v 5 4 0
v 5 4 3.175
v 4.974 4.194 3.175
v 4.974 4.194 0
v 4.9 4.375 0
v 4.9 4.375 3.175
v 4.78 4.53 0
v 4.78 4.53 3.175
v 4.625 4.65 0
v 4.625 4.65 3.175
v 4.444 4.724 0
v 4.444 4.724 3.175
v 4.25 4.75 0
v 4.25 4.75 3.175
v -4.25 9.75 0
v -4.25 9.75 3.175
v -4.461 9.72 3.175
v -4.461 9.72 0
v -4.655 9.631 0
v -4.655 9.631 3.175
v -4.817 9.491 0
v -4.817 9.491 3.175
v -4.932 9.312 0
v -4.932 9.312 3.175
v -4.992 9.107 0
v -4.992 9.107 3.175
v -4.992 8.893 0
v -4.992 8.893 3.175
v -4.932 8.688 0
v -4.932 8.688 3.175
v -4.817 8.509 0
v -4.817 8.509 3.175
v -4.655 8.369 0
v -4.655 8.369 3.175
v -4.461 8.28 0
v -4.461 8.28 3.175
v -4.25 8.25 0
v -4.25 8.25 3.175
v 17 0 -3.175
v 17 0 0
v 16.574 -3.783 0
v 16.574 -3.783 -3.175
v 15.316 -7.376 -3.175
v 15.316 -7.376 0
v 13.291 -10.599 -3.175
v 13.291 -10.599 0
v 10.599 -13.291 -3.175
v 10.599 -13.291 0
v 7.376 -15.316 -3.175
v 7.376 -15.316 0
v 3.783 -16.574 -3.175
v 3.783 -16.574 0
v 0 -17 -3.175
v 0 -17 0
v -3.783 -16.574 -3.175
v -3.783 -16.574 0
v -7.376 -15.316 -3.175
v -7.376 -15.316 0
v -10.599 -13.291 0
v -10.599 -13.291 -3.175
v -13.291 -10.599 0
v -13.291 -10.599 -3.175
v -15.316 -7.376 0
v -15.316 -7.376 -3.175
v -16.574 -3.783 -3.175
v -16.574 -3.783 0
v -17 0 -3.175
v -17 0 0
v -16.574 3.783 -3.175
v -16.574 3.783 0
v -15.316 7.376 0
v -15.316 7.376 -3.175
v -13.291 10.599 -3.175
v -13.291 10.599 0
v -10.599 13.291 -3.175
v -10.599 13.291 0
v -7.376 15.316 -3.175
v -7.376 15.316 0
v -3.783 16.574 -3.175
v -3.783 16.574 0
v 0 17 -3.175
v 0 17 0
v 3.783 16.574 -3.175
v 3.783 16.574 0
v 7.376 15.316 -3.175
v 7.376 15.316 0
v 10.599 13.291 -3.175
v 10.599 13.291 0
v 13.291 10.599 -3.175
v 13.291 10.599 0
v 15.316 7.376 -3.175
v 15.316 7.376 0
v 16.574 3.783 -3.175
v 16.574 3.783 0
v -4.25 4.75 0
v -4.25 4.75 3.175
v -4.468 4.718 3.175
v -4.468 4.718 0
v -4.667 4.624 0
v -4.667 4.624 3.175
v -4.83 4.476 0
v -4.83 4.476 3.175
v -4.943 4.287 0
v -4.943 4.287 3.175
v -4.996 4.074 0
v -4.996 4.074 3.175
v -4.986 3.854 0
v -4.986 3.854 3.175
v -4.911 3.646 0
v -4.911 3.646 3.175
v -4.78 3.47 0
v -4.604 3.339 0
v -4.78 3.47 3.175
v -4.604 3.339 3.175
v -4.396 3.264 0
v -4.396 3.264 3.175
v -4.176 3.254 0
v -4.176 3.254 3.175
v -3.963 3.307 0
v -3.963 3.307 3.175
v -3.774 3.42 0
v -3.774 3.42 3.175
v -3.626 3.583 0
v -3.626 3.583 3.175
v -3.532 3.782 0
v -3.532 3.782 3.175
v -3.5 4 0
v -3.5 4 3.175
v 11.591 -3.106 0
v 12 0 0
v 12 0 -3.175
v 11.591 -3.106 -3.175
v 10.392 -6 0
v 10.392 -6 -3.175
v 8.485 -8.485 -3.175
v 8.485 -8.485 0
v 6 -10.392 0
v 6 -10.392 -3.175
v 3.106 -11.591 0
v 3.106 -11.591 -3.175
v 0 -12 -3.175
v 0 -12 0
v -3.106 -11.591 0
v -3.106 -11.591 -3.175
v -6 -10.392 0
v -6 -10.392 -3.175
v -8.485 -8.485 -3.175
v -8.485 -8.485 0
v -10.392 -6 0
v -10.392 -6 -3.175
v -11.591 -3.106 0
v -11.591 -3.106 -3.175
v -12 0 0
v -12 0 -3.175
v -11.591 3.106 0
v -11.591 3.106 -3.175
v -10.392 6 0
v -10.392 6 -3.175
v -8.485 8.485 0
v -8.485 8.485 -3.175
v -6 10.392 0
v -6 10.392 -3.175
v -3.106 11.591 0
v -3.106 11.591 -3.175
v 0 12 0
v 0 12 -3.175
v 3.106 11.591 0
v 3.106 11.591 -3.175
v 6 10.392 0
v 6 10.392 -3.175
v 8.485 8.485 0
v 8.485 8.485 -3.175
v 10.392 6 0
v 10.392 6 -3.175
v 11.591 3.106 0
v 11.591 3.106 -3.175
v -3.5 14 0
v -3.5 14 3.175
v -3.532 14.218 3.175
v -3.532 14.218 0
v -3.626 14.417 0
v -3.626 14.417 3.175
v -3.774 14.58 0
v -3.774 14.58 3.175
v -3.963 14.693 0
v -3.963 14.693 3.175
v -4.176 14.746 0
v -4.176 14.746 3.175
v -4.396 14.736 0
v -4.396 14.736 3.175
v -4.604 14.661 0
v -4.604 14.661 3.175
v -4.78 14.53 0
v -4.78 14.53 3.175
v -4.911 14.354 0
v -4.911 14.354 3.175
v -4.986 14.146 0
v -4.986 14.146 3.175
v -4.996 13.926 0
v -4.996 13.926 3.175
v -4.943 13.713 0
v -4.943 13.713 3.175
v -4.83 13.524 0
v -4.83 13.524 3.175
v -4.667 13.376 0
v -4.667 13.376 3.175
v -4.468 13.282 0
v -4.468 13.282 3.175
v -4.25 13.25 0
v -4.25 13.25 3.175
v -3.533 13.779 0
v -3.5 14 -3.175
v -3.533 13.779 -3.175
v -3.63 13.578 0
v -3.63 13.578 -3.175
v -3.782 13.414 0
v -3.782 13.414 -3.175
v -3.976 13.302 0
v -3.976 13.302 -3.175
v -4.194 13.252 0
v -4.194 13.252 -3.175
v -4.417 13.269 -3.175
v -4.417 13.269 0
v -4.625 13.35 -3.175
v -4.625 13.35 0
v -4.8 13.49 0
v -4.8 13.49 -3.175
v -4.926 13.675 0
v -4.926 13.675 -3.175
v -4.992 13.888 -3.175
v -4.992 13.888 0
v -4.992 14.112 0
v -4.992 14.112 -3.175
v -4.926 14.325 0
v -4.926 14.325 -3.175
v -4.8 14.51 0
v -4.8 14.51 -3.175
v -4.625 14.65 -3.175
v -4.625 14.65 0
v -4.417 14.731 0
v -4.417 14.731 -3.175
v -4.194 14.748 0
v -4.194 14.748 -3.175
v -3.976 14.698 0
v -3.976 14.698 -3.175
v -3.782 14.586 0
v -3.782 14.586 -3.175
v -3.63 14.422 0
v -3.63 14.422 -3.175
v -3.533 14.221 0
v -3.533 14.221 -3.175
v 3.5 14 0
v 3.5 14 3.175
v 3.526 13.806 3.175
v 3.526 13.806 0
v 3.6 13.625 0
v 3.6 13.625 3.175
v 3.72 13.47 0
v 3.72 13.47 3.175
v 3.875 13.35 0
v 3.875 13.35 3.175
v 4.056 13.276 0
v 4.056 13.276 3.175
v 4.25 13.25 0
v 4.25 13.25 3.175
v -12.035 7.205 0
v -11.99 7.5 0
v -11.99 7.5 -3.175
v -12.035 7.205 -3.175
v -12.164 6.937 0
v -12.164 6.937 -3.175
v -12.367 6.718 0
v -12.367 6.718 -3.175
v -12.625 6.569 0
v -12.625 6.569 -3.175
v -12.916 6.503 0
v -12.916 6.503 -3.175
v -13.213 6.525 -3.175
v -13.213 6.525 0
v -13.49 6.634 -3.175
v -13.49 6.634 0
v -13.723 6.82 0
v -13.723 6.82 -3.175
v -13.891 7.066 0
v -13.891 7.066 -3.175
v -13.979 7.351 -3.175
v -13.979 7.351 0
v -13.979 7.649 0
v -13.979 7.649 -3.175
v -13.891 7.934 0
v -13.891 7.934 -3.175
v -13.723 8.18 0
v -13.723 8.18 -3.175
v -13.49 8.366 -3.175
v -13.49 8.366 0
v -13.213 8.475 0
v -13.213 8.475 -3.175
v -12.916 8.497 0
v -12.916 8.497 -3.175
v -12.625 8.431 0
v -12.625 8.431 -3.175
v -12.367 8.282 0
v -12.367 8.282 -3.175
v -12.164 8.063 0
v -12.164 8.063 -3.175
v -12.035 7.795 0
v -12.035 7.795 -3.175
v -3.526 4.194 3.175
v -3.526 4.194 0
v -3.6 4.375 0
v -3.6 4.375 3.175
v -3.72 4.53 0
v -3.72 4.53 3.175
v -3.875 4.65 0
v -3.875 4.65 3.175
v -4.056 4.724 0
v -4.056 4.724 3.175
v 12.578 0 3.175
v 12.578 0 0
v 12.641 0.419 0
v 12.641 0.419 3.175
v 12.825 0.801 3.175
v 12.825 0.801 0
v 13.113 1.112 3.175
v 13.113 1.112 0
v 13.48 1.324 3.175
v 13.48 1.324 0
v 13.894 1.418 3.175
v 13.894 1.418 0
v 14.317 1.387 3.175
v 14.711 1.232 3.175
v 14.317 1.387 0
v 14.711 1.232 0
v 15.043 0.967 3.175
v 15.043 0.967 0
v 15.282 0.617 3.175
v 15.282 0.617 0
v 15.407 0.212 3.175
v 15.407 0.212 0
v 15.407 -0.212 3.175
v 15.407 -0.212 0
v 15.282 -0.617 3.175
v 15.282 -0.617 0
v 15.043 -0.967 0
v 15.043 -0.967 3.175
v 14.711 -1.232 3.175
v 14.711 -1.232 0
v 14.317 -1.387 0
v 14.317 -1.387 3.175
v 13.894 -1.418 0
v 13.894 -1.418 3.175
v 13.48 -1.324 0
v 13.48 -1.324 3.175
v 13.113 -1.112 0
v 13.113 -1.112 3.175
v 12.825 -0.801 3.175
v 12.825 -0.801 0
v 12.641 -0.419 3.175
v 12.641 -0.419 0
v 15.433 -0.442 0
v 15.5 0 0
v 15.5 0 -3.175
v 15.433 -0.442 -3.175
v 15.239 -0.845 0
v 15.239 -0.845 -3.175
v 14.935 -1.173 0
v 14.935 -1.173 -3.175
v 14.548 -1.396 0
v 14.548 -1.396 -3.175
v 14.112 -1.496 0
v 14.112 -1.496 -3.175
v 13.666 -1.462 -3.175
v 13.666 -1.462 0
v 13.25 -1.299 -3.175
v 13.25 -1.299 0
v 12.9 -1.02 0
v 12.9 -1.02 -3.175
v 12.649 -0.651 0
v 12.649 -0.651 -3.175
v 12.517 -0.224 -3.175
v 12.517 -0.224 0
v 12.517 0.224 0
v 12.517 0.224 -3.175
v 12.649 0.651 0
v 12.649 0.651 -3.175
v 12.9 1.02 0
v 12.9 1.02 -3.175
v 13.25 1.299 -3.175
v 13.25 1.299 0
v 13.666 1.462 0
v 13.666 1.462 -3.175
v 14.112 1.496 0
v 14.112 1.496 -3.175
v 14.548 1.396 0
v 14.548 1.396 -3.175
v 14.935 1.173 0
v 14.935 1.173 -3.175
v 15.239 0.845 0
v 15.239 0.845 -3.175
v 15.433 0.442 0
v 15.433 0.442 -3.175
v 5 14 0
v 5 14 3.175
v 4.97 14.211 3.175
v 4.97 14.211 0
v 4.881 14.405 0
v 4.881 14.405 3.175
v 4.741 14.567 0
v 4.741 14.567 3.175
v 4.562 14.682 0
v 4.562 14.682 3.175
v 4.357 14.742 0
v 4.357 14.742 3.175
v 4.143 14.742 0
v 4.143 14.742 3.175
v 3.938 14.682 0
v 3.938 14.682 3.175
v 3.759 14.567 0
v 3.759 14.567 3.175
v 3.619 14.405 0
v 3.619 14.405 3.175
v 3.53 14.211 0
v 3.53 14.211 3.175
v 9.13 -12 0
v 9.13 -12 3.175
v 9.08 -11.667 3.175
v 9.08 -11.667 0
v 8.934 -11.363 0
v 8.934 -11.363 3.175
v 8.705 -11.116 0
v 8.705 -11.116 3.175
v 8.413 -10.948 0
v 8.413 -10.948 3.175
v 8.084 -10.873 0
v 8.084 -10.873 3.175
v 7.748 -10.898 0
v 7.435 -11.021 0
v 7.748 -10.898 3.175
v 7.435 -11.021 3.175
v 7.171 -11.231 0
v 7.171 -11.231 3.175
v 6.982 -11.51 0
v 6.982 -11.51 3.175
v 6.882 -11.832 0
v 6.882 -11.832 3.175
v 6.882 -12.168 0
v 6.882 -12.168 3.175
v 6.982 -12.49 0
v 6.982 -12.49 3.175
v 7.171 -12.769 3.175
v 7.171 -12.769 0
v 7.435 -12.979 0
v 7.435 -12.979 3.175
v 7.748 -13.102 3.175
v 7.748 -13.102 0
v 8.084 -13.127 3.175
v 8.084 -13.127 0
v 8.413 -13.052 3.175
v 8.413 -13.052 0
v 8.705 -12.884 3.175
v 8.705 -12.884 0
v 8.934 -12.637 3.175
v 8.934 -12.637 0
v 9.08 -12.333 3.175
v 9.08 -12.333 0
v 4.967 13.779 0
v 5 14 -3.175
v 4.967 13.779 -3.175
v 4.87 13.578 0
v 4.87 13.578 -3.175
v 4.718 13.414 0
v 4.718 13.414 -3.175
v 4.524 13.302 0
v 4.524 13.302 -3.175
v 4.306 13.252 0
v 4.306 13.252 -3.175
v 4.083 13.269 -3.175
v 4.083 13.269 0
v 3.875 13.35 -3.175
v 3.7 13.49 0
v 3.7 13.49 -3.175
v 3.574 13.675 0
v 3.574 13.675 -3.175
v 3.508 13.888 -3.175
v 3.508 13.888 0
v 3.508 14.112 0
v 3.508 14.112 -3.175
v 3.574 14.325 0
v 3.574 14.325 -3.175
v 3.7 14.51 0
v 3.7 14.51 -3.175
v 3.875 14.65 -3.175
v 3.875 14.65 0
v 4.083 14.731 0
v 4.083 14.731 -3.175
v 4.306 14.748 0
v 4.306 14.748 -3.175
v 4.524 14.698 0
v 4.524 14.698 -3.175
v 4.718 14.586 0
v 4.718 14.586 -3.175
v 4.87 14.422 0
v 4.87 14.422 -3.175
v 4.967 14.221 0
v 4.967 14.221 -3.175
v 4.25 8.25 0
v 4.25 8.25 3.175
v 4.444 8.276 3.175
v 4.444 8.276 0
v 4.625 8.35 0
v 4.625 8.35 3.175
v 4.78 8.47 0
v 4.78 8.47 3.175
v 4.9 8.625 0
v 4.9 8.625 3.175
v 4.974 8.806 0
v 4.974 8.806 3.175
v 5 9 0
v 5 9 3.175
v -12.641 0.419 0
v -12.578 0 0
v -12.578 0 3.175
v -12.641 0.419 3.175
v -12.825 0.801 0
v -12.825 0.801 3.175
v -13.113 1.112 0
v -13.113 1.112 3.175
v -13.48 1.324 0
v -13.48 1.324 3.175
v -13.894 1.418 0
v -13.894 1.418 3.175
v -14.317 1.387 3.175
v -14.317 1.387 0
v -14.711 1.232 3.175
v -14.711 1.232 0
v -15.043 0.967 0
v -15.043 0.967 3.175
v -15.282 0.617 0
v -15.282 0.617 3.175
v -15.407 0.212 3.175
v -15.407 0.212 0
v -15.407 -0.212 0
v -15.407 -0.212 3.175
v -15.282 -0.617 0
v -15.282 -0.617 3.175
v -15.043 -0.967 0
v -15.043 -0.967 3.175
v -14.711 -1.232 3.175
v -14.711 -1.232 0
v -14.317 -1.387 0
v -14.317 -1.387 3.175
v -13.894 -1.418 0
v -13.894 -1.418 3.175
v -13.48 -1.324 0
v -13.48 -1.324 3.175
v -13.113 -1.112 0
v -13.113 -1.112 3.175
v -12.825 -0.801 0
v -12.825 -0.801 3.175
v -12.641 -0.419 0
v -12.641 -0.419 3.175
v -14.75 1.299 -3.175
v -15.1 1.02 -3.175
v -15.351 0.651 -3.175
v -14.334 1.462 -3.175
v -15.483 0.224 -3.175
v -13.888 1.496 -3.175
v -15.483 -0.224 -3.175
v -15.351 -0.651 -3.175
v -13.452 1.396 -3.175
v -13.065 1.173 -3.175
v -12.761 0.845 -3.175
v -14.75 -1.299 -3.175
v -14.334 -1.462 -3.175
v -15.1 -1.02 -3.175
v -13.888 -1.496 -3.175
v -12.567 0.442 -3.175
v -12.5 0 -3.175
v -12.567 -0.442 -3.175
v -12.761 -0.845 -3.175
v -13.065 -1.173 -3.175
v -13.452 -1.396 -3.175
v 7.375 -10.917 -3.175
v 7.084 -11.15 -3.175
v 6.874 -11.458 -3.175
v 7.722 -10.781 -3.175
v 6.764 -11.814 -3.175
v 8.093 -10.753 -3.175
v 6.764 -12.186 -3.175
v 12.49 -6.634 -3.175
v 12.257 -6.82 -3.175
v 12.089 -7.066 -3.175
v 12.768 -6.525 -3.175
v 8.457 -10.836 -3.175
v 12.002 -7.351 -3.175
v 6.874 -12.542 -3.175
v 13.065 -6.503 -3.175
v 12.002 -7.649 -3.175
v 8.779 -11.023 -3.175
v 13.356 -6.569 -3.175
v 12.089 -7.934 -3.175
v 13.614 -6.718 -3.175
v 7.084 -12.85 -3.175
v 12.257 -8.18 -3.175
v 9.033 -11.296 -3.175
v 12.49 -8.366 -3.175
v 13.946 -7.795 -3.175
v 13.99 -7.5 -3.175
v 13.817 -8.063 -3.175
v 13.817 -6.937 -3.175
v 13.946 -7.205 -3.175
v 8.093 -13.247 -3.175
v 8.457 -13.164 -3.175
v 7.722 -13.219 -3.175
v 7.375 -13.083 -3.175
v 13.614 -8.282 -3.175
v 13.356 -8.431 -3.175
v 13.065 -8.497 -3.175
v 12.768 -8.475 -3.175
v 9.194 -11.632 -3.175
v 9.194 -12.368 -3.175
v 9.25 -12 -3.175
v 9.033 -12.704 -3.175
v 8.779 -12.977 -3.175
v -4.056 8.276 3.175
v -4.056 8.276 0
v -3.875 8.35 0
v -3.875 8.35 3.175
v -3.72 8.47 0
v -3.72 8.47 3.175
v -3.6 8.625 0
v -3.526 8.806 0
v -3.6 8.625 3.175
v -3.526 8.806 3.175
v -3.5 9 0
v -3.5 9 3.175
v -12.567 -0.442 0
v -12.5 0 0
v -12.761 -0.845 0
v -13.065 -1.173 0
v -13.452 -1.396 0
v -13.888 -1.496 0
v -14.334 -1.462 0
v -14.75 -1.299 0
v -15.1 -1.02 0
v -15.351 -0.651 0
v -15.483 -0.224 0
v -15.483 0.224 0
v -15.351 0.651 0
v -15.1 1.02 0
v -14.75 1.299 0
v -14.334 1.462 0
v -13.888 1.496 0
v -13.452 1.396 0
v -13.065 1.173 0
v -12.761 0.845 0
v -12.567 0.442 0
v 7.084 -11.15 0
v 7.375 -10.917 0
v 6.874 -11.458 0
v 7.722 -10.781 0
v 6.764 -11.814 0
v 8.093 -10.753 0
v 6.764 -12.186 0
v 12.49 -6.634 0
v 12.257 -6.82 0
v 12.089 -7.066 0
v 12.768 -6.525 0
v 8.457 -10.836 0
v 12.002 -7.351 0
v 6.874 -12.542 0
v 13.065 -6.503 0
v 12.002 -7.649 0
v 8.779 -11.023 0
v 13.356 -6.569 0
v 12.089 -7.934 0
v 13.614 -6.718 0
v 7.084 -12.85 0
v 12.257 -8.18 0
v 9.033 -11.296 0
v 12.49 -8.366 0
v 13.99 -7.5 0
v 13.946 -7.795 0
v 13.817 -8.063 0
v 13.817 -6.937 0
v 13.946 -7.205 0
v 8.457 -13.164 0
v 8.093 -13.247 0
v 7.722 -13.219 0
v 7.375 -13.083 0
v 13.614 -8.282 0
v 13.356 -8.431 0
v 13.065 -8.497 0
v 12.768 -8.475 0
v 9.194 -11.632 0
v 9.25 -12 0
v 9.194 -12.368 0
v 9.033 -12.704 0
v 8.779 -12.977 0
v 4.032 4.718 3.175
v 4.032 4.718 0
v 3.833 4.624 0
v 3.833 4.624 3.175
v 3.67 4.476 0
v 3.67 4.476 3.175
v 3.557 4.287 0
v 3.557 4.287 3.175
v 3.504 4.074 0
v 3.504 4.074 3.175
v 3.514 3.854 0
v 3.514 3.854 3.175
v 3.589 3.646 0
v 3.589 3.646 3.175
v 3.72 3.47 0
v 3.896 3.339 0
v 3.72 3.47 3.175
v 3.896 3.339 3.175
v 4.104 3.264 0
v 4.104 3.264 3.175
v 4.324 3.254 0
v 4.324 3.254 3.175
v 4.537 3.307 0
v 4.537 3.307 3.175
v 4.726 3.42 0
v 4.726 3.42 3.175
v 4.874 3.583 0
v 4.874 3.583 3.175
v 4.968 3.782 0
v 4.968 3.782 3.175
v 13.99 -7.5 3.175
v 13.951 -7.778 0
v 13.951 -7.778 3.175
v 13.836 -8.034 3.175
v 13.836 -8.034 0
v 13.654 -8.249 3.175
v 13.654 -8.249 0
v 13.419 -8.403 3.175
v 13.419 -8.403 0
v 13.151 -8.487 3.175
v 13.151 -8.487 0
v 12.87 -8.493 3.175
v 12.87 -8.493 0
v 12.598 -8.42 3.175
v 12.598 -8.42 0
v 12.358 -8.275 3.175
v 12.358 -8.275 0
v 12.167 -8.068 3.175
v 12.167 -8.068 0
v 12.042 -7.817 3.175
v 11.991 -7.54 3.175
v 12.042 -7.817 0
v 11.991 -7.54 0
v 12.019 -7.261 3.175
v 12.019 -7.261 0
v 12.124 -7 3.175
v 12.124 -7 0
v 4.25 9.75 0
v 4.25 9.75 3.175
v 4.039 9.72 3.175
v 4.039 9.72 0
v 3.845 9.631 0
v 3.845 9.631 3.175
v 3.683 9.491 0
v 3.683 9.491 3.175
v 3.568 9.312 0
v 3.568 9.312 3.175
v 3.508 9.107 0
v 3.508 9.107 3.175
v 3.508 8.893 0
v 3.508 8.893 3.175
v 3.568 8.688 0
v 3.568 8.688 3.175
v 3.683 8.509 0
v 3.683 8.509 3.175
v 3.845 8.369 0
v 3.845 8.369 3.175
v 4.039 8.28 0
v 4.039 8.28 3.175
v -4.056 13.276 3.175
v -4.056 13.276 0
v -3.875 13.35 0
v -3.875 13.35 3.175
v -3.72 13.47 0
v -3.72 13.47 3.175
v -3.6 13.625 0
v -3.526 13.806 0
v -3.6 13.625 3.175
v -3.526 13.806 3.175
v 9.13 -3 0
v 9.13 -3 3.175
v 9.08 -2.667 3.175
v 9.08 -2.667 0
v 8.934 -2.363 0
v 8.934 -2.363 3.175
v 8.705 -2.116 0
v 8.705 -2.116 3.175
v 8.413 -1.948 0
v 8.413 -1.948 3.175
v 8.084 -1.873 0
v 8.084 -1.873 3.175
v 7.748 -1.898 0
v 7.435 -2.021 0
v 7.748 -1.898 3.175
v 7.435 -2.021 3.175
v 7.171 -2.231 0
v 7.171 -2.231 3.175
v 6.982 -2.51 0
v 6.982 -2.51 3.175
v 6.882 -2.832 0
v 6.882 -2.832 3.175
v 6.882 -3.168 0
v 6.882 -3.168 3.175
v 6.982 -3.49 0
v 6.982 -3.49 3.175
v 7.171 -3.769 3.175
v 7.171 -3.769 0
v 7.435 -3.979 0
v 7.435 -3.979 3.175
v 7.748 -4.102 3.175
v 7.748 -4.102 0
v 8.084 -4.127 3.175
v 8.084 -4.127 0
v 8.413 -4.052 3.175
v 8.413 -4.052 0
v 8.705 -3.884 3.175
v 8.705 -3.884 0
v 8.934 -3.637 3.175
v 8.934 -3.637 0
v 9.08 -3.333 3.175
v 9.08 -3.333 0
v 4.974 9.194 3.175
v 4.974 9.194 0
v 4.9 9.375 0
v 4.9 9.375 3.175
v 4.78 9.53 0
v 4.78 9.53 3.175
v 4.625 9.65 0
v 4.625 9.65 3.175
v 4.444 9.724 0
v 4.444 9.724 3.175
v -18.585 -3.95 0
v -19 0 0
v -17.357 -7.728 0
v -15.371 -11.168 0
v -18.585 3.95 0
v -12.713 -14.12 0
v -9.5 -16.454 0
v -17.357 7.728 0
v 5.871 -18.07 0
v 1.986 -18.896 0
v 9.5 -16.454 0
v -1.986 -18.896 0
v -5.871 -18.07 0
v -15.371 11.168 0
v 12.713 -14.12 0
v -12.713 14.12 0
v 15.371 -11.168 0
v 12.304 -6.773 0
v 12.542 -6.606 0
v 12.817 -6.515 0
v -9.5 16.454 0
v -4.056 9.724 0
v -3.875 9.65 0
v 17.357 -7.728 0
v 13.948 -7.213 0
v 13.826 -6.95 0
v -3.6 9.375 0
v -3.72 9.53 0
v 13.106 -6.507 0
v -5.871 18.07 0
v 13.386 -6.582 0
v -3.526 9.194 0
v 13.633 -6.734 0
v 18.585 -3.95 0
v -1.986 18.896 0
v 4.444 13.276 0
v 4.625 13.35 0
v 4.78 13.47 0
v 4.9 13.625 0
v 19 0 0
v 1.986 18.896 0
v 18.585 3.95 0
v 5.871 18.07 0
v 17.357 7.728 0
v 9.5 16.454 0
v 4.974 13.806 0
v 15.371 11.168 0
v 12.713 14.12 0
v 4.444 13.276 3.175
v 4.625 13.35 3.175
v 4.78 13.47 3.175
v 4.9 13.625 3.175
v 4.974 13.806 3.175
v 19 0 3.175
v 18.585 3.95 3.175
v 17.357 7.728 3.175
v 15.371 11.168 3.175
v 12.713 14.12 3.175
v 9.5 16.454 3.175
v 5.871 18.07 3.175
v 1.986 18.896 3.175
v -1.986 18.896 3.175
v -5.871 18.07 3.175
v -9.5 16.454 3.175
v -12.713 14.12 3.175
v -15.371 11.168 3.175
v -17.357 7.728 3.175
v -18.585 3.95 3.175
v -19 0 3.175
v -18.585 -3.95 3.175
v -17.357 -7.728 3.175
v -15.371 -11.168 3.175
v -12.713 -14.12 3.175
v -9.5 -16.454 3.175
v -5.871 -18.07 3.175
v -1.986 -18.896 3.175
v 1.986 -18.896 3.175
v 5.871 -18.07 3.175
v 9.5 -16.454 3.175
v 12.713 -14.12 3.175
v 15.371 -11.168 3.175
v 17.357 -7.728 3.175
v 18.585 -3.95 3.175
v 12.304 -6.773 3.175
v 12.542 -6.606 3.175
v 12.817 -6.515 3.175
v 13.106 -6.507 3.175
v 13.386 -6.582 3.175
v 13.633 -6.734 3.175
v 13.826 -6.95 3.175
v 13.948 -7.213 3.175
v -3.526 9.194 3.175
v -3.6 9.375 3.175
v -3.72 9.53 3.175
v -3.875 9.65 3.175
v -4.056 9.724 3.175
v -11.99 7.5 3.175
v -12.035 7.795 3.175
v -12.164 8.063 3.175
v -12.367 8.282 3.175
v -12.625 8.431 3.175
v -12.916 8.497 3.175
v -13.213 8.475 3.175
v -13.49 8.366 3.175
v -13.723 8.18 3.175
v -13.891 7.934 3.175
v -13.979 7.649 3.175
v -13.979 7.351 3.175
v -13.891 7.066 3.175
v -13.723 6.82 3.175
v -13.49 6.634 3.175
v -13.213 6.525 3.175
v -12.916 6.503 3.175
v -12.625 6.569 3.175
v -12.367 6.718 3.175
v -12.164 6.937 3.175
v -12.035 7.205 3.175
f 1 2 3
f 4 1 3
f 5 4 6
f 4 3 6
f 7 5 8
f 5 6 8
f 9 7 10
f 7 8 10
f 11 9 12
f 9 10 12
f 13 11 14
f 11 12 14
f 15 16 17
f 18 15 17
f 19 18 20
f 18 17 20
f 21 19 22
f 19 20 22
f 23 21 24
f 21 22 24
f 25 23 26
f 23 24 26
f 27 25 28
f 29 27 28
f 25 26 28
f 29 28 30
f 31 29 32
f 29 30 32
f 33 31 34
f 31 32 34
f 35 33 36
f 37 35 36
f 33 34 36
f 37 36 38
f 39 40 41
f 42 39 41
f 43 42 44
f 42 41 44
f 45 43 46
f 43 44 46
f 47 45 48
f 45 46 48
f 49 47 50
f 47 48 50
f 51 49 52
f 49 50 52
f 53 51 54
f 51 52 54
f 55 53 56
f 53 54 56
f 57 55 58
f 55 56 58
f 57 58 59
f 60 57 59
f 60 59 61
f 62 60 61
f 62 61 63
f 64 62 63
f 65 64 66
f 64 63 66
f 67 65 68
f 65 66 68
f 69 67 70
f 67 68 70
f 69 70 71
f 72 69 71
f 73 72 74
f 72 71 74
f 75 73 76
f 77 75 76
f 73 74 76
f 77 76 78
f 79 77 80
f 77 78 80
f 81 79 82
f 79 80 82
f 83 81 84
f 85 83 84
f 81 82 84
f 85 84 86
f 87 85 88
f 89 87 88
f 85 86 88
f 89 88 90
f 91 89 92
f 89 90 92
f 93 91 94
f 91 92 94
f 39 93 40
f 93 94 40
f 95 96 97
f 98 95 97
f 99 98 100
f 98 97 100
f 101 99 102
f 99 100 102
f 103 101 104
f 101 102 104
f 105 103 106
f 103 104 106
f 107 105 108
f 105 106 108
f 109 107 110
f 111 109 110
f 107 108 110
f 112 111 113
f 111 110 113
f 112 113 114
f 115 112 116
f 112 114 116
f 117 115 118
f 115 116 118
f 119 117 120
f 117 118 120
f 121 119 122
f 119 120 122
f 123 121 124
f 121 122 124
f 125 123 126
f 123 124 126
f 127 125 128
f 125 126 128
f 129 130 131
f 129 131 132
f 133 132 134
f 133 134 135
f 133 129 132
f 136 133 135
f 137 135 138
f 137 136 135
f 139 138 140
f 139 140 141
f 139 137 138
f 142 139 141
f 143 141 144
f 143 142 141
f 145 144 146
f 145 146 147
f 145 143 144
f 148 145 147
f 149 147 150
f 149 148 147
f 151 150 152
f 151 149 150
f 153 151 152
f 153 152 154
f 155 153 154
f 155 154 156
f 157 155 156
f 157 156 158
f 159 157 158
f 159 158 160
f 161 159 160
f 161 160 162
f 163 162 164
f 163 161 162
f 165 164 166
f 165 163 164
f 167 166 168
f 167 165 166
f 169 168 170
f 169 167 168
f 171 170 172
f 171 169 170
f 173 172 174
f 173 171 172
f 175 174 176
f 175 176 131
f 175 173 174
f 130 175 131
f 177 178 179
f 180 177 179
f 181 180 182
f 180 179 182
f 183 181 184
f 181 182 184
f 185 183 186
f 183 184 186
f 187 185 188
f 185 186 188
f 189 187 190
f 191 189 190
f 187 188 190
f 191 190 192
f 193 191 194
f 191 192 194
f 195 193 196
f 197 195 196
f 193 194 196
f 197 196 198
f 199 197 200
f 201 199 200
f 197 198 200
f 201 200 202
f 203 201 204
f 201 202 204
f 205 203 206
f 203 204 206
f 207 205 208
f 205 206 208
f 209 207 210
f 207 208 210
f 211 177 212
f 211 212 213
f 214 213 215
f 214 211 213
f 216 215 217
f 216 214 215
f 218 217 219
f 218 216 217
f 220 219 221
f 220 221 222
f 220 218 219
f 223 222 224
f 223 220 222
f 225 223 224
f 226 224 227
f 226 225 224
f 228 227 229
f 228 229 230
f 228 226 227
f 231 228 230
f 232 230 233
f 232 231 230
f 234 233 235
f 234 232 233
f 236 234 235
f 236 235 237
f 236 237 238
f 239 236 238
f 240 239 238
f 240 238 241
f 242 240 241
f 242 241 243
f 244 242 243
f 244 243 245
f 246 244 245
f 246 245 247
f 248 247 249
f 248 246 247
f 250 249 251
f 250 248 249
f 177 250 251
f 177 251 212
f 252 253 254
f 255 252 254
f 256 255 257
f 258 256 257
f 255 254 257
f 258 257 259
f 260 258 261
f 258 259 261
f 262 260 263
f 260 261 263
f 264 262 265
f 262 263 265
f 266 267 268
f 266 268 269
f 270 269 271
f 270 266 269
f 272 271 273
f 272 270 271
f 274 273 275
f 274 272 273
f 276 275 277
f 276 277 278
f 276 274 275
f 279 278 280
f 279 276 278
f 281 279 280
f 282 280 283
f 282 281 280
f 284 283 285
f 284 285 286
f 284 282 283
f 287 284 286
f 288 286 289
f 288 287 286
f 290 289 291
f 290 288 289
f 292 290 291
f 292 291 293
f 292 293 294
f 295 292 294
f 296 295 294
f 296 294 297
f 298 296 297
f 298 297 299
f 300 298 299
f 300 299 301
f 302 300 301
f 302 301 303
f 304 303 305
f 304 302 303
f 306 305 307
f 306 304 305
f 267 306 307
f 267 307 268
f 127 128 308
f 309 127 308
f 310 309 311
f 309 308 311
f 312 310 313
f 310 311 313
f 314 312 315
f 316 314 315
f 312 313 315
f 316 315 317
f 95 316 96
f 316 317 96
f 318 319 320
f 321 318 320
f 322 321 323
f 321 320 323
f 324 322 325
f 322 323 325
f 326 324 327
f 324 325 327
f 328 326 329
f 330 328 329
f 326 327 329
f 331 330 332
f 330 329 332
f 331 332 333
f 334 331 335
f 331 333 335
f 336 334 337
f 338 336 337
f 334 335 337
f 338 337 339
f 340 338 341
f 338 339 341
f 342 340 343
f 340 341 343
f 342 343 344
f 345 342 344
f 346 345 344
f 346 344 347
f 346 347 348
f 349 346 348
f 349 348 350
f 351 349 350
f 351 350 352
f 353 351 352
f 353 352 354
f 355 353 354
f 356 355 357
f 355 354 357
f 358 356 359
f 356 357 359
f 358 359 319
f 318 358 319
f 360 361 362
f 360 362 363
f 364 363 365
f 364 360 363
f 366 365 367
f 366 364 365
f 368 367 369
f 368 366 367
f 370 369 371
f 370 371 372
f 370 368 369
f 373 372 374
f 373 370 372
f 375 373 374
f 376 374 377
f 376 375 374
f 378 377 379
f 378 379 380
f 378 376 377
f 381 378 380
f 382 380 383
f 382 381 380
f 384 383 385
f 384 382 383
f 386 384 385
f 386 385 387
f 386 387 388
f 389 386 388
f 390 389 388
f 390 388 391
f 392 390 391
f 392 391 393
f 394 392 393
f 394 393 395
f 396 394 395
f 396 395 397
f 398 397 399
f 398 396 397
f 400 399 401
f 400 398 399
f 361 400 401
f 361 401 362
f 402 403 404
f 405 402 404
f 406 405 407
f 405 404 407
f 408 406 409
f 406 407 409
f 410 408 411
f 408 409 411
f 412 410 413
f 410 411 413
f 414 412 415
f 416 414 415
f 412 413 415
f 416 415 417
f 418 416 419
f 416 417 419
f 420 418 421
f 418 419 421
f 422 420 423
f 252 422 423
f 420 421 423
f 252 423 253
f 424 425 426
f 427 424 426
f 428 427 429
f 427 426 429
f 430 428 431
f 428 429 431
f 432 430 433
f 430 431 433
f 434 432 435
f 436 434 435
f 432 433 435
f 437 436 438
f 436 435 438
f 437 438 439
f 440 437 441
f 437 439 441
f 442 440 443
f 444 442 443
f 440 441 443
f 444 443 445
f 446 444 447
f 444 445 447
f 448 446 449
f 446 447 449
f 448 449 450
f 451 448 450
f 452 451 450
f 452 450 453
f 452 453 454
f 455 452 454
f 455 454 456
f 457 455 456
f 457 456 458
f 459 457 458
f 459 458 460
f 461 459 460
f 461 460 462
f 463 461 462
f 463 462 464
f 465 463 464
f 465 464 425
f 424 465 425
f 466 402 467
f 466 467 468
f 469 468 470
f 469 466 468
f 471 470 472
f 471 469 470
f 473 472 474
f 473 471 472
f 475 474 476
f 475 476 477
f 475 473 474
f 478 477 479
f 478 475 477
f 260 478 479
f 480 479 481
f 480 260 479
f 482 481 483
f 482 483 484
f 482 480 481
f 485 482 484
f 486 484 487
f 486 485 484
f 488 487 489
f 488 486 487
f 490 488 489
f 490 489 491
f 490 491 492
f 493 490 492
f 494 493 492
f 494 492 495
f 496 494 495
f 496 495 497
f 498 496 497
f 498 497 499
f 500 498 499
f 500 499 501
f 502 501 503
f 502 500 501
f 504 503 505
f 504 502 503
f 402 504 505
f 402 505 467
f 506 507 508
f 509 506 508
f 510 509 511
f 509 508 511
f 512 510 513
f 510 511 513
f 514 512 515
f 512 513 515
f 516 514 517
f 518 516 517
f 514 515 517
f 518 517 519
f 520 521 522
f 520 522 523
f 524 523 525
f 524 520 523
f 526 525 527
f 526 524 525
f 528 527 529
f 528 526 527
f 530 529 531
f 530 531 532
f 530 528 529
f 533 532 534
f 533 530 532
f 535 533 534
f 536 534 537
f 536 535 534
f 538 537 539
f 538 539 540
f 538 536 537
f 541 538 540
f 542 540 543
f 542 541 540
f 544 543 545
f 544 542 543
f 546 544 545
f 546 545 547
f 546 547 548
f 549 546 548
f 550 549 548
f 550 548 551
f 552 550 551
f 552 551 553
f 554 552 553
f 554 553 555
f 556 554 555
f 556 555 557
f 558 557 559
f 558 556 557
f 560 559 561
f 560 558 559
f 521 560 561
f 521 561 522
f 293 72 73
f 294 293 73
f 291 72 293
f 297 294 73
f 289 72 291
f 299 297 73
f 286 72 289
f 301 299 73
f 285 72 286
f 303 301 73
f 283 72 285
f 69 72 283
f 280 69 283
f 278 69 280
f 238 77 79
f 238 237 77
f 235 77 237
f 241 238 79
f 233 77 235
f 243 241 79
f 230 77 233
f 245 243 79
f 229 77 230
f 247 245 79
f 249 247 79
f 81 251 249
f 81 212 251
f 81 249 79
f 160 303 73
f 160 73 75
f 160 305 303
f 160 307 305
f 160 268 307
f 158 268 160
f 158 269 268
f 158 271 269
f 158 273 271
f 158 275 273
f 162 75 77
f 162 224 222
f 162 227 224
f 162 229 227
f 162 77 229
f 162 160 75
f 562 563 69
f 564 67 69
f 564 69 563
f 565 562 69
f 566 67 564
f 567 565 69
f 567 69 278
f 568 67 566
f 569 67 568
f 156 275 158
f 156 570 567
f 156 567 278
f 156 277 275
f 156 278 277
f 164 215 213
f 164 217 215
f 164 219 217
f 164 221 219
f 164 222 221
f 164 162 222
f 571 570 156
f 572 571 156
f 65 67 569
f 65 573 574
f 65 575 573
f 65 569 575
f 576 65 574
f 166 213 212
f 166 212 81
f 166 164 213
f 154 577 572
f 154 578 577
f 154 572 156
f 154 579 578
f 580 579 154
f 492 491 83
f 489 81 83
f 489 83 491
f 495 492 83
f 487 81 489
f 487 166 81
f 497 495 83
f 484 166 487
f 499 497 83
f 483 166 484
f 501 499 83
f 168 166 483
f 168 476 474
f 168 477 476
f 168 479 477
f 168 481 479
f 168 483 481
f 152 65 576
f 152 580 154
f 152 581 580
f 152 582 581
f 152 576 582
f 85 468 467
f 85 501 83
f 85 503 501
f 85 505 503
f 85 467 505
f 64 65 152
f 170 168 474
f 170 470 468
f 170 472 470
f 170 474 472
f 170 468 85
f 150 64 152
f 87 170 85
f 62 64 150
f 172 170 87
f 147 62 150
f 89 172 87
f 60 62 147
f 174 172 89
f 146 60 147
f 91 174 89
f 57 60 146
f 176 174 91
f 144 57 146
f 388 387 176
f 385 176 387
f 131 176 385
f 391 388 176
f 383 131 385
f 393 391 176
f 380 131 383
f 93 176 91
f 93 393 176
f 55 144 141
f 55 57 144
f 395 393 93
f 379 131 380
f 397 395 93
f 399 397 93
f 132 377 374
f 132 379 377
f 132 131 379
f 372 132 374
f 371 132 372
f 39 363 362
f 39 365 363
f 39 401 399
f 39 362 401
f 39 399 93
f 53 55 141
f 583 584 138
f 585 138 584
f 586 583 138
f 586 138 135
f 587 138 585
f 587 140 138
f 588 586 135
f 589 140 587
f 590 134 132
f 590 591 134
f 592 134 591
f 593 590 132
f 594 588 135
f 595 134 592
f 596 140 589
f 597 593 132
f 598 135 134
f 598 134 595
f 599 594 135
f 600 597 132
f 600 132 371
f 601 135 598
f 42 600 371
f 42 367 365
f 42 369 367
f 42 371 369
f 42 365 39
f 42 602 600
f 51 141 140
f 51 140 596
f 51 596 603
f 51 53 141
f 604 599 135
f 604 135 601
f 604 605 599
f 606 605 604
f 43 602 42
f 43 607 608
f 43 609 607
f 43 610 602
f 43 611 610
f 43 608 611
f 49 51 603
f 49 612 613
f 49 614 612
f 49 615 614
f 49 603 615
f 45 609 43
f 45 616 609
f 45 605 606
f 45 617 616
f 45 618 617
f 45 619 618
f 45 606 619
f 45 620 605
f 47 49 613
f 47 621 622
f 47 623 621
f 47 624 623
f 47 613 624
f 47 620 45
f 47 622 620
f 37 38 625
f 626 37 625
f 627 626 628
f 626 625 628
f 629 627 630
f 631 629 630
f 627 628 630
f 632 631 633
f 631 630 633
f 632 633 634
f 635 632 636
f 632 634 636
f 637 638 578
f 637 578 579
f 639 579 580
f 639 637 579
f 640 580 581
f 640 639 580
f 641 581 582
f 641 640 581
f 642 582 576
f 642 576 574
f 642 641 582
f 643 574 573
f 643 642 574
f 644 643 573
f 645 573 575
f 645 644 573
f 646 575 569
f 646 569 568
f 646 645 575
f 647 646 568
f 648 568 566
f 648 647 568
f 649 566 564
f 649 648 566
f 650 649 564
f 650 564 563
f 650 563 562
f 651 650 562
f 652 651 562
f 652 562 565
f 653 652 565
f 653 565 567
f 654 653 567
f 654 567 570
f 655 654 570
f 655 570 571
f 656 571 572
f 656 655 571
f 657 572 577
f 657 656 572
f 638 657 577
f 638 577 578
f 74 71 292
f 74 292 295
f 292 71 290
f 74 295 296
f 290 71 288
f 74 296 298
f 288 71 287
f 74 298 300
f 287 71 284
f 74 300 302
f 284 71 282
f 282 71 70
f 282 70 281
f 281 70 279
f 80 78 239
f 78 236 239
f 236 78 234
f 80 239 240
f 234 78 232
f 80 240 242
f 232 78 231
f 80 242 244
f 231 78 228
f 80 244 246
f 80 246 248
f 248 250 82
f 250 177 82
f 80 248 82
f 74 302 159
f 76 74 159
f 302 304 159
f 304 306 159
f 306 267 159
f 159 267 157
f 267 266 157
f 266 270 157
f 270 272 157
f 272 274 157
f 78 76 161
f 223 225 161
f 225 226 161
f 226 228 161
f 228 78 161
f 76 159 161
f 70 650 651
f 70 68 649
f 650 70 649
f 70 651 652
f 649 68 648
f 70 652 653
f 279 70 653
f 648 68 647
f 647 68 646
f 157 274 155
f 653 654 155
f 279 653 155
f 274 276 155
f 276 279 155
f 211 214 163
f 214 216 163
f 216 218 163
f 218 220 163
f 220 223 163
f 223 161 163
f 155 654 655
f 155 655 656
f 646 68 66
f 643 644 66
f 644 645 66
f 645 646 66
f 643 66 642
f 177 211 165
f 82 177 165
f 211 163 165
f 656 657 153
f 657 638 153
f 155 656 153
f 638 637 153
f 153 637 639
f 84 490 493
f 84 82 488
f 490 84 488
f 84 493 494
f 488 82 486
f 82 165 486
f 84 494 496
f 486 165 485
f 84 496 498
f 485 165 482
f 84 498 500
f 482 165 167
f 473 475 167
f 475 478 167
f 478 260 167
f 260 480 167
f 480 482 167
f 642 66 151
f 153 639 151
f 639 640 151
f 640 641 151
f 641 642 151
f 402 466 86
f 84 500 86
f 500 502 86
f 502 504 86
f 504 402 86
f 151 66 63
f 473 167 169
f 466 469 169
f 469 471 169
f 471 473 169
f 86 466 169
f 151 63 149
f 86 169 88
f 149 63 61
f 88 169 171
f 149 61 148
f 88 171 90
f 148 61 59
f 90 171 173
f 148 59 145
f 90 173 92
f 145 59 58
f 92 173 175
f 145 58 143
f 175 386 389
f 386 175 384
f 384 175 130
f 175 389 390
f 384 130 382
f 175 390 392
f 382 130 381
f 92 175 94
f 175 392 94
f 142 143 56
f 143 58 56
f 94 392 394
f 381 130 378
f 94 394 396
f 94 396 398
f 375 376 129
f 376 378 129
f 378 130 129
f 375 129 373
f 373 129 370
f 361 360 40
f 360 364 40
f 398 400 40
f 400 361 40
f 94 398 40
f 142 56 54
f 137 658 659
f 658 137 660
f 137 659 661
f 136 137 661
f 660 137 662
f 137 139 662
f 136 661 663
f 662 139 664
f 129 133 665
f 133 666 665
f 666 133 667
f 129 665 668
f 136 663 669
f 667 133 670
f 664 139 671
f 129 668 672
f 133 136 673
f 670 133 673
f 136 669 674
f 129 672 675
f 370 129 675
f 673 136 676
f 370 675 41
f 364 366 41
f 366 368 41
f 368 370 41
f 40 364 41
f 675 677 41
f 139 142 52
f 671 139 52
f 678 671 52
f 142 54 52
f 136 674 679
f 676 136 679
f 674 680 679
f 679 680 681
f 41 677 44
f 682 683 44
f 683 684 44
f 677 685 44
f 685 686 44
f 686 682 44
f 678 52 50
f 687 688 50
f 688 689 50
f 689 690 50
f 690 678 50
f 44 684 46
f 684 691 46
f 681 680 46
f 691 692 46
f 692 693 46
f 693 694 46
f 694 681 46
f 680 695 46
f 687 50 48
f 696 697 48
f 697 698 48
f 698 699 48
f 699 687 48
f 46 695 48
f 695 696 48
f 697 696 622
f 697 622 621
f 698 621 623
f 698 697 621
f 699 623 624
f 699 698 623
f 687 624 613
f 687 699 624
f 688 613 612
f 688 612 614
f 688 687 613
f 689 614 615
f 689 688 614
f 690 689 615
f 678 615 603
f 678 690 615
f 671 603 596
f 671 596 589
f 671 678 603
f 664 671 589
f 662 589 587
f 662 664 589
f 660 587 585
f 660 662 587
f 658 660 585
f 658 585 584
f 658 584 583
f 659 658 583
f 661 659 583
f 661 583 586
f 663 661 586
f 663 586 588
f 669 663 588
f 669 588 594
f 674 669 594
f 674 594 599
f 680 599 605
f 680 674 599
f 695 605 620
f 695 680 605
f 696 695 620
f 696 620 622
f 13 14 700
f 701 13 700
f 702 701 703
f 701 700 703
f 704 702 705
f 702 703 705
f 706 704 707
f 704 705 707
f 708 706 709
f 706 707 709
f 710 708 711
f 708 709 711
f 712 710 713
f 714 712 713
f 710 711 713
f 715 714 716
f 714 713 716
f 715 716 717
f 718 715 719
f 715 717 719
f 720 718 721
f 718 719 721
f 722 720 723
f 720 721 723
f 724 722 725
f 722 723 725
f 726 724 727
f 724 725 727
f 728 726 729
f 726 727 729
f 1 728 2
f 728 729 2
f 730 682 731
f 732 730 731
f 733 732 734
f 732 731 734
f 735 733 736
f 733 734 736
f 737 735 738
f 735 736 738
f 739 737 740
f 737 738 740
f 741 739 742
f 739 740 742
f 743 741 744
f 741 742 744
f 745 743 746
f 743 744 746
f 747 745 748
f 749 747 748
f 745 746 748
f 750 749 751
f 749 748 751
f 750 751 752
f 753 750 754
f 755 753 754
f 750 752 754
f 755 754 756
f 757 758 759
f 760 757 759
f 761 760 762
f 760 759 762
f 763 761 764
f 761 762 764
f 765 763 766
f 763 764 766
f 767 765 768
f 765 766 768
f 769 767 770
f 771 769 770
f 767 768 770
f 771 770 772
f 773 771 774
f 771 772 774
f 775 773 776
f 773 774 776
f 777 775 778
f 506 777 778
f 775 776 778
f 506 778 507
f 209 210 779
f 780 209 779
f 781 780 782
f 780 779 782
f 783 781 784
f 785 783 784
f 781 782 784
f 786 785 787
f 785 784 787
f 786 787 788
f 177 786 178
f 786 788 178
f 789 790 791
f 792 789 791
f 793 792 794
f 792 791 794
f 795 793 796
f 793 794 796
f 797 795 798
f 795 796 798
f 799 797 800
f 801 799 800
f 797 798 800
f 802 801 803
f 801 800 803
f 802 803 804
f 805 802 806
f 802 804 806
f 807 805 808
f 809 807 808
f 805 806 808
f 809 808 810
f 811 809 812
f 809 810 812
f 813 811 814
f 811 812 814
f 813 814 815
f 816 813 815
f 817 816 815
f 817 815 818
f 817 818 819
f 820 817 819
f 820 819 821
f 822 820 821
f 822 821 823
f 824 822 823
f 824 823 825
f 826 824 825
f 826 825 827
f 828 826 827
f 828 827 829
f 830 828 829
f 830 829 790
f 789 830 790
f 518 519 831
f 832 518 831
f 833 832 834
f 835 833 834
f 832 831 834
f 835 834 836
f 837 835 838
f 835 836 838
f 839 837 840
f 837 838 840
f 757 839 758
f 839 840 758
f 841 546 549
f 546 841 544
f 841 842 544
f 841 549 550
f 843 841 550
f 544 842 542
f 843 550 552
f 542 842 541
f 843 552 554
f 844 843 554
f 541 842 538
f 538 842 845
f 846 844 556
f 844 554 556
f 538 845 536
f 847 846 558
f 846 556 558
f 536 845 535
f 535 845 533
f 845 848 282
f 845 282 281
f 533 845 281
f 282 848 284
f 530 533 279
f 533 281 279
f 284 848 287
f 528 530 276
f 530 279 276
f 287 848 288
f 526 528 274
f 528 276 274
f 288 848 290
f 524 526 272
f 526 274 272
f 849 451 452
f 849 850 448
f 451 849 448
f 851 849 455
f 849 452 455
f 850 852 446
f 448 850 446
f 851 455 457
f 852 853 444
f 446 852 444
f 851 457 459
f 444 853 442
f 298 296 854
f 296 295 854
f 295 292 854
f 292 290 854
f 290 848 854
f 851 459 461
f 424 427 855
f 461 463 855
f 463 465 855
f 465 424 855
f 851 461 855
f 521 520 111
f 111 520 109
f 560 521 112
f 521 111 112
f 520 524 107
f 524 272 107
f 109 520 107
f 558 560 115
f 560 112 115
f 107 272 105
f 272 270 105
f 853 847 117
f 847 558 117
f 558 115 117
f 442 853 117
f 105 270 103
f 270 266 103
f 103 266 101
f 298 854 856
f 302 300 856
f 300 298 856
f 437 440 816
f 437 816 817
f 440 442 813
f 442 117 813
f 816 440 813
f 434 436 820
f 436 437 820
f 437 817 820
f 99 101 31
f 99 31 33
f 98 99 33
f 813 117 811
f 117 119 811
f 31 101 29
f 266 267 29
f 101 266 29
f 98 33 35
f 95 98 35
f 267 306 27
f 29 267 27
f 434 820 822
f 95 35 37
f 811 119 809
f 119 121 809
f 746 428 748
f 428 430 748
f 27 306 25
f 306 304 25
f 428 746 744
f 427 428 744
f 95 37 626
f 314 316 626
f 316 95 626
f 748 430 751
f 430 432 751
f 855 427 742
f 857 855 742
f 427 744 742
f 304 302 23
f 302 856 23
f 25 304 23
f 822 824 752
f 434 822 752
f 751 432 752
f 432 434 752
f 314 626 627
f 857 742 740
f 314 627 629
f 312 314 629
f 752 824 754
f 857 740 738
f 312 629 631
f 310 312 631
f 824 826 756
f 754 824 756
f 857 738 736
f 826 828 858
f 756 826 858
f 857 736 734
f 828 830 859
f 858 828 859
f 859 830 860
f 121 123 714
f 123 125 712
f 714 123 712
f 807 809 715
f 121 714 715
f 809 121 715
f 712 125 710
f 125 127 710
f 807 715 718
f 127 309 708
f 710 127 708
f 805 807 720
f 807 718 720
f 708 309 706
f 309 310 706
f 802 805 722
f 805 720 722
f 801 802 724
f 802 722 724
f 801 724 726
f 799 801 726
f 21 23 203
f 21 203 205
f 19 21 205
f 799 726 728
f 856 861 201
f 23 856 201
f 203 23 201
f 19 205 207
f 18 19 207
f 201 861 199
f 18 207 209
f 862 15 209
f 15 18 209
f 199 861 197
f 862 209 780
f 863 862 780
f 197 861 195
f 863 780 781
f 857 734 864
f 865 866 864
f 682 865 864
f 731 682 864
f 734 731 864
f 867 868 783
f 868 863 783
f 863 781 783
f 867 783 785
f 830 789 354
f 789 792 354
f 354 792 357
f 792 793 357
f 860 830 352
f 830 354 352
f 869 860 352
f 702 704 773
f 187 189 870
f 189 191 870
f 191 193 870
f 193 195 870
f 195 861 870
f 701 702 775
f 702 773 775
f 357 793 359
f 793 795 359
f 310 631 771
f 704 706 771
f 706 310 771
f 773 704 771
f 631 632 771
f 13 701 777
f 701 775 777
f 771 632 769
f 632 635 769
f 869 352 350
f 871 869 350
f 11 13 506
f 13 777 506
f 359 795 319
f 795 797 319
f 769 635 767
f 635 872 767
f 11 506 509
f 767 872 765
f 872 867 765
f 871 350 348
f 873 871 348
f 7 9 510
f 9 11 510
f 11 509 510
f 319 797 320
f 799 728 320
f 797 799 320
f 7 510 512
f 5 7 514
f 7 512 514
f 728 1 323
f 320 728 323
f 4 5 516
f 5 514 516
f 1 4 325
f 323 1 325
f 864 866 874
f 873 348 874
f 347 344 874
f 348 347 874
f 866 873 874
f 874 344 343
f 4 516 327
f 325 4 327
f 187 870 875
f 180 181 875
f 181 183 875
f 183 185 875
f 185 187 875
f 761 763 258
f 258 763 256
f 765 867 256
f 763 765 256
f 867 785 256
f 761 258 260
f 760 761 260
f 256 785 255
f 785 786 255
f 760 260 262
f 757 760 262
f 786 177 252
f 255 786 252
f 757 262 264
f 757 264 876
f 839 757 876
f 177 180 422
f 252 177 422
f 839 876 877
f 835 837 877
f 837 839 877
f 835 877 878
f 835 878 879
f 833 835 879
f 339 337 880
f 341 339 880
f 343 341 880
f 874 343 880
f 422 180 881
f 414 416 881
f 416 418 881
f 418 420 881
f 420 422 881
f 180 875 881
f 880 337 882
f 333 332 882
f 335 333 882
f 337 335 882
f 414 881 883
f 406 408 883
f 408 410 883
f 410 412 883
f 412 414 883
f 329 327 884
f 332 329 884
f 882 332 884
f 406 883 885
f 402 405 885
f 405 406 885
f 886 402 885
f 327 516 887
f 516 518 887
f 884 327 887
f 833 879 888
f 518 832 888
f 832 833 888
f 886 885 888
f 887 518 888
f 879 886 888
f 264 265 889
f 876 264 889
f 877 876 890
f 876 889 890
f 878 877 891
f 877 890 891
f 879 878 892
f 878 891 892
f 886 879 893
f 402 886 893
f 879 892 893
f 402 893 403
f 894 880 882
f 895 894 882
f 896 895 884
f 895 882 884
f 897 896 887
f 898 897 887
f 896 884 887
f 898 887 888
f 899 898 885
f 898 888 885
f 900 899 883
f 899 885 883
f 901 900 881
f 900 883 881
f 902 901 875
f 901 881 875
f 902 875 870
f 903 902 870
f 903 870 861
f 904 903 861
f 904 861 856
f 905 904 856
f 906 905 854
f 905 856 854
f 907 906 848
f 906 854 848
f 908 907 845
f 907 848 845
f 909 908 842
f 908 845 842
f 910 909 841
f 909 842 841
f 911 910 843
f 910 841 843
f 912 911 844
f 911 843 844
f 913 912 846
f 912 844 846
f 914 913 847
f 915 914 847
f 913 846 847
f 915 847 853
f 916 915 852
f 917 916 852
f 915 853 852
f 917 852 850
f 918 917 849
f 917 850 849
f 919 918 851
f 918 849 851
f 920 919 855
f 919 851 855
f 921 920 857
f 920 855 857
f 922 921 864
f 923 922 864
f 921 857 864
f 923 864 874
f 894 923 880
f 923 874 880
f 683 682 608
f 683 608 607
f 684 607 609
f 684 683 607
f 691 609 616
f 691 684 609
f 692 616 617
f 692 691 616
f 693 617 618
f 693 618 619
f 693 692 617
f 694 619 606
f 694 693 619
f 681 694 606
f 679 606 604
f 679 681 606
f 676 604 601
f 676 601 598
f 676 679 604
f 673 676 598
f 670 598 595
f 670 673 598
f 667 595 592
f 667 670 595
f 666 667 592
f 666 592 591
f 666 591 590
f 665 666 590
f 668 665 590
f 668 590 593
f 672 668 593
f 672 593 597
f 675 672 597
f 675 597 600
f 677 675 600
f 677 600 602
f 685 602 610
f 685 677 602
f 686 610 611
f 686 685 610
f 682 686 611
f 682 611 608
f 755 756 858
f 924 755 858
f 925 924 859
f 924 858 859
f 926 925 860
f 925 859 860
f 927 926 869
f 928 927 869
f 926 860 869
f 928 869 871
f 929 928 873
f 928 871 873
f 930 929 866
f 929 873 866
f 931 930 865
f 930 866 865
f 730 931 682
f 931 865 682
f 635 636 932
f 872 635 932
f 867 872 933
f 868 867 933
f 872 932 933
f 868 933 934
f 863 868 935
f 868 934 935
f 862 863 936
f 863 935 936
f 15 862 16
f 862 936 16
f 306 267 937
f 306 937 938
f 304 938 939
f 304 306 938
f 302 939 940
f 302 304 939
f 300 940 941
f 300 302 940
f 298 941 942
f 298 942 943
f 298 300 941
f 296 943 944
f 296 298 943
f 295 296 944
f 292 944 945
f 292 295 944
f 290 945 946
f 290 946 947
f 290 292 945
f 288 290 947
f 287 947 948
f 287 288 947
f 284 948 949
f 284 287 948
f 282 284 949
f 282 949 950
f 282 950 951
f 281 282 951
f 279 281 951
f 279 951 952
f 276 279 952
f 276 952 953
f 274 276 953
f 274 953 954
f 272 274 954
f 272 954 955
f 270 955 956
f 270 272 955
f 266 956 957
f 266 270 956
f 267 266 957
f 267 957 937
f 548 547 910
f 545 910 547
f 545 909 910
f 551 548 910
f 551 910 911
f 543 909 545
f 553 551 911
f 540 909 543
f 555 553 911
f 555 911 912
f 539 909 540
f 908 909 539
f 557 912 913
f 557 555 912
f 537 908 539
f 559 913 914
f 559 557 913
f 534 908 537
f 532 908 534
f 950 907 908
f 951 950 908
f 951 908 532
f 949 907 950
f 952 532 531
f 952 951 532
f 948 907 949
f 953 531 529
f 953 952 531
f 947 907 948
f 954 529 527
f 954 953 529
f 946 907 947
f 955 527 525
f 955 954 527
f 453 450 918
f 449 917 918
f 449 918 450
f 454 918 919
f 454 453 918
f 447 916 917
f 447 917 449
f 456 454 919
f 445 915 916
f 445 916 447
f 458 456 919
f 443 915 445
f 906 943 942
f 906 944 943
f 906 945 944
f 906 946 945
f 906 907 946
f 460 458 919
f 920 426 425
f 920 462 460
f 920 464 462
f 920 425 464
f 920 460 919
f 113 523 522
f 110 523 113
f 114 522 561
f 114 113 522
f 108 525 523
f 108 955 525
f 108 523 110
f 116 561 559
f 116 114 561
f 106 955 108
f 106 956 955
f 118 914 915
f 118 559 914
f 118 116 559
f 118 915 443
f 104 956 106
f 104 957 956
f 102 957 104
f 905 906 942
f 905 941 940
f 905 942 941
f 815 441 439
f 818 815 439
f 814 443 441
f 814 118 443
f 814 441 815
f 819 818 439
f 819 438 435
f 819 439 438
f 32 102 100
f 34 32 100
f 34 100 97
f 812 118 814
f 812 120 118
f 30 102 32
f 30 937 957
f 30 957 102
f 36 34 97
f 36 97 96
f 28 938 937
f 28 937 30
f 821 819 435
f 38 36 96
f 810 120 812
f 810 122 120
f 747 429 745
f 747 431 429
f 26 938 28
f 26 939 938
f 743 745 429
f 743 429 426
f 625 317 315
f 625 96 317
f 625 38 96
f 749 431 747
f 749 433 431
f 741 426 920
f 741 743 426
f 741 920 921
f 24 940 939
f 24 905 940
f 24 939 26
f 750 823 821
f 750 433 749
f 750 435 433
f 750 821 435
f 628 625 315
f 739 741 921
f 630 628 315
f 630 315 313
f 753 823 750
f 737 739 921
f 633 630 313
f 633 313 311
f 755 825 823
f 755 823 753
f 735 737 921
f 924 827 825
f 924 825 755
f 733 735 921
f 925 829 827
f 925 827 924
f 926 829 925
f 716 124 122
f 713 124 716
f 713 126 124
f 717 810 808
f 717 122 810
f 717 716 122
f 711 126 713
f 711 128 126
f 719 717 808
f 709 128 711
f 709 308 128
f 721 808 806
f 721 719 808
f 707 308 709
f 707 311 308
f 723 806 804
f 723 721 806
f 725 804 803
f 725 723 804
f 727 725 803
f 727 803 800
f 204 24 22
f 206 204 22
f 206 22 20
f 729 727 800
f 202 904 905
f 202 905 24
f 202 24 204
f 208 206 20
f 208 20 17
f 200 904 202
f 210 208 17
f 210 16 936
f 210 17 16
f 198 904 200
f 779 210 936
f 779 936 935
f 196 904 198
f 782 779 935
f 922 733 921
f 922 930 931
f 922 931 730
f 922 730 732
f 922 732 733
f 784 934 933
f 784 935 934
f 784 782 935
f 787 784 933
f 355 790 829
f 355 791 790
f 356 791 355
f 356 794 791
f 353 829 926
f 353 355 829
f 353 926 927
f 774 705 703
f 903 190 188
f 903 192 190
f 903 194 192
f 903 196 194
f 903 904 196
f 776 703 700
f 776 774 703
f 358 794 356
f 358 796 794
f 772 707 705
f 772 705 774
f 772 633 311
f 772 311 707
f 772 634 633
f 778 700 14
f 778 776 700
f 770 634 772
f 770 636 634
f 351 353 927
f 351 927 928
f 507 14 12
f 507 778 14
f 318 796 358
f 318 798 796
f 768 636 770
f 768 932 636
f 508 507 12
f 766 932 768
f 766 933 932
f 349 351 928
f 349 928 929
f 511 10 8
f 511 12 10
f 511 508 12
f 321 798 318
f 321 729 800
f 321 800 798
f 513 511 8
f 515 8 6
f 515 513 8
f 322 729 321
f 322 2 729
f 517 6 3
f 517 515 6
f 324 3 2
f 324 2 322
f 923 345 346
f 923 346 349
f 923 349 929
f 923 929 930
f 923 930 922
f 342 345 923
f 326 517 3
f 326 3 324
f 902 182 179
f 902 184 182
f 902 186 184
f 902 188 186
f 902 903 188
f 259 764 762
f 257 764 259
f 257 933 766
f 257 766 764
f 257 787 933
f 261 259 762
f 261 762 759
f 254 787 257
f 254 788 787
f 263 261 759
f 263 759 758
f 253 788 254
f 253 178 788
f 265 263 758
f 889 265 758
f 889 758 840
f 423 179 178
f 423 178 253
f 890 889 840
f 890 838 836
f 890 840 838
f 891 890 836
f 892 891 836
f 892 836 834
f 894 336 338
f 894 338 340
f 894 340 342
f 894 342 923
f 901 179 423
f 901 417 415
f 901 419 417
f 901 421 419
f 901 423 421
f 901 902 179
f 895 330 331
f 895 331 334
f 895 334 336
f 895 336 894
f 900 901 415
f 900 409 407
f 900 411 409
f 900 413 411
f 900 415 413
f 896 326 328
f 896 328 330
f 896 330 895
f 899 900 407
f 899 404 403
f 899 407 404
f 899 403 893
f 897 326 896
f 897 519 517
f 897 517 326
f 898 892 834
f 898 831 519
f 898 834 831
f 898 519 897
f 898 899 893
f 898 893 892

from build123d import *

# Parameters (mm, degrees)
F0_R     = 19
F0_R_2   = 1
F0_R_3   = 1.4224
F1_DEPTH = 3.175
F3_DEPTH = 25
F4_R     = 1.1303
F5_DEPTH = 25
F6_R     = 17
F6_R_2   = 0.75
F6_R_3   = 1
F6_R_4   = 1.5
F6_R_5   = 12
F6_R_6   = 1.25
F7_DEPTH = 3.175


with BuildPart() as f1:
    # F0 (on Top) → F1 (new body)
    with BuildSketch(Plane.XY):
        Circle(F0_R)
        with Locations((-7.5, -12.9903810568)):
            Circle(F0_R_2, mode=Mode.SUBTRACT)
        with BuildLine():
            ThreePointArc((13.9903810568, -7.5), (12.7315620117, -8.4659258263), (12.124355653, -7))
            ThreePointArc((12.124355653, -7), (13.2492001019, -6.5340741737), (13.9903810568, -7.5))
        make_face(mode=Mode.SUBTRACT)
        with Locations((-14, 0)):
            Circle(F0_R_3, mode=Mode.SUBTRACT)
        with Locations((-12.9903810568, 7.5)):
            Circle(F0_R_2, mode=Mode.SUBTRACT)
        with BuildLine():
            ThreePointArc((15.4224, 0), (14, -1.4224), (12.5776, 0))
            ThreePointArc((12.5776, 0), (14, 1.4224), (15.4224, 0))
        make_face(mode=Mode.SUBTRACT)
        with Locations((7.5, 12.9903810568)):
            Circle(F0_R_2, mode=Mode.SUBTRACT)
        with Locations((-7.5, -12.9903810568)):
            Circle(F0_R_2)
        with Locations((7.5, 12.9903810568)):
            Circle(F0_R_2)
    extrude(amount=F1_DEPTH)

    # F2 (on face) → F3 (cut)
    with BuildSketch(Plane.XY.offset(3.175)):
        with BuildLine():
            Line((-4.25, 13.25), (-4.25, 14))
            Line((-4.25, 14), (-3.5, 14))
            ThreePointArc((-3.5, 14), (-4.7803300859, 14.5303300859), (-4.25, 13.25))
        make_face()
        with BuildLine():
            Line((-3.5, 14), (-4.25, 14))
            Line((-4.25, 14), (-4.25, 13.25))
            ThreePointArc((-4.25, 13.25), (-3.7196699141, 13.4696699141), (-3.5, 14))
        make_face()
        with BuildLine():
            ThreePointArc((5, 4), (4.7803300859, 4.5303300859), (4.25, 4.75))
            ThreePointArc((4.25, 4.75), (3.7196699141, 3.4696699141), (5, 4))
        make_face()
        with BuildLine():
            ThreePointArc((5, 9), (4.7803300859, 9.5303300859), (4.25, 9.75))
            Line((4.25, 9.75), (4.25, 9))
            Line((4.25, 9), (4.25, 8.25))
            ThreePointArc((4.25, 8.25), (4.7803300859, 8.4696699141), (5, 9))
        make_face()
        with BuildLine():
            Line((4.25, 9), (4.25, 9.75))
            ThreePointArc((4.25, 9.75), (3.5, 9), (4.25, 8.25))
            Line((4.25, 8.25), (4.25, 9))
        make_face()
        with BuildLine():
            ThreePointArc((5, 14), (4.25, 14.75), (3.5, 14))
            Line((3.5, 14), (4.25, 14))
            Line((4.25, 14), (4.25, 13.25))
            ThreePointArc((4.25, 13.25), (4.7803300859, 13.4696699141), (5, 14))
        make_face()
        with BuildLine():
            Line((4.25, 14), (3.5, 14))
            ThreePointArc((3.5, 14), (3.7196699141, 13.4696699141), (4.25, 13.25))
            Line((4.25, 13.25), (4.25, 14))
        make_face()
        with BuildLine():
            ThreePointArc((-3.5, 4), (-3.7196699141, 4.5303300859), (-4.25, 4.75))
            ThreePointArc((-4.25, 4.75), (-4.7803300859, 3.4696699141), (-3.5, 4))
        make_face()
        with BuildLine():
            ThreePointArc((-3.5, 9), (-3.7196699141, 9.5303300859), (-4.25, 9.75))
            Line((-4.25, 9.75), (-4.25, 9))
            Line((-4.25, 9), (-4.25, 8.25))
            ThreePointArc((-4.25, 8.25), (-3.7196699141, 8.4696699141), (-3.5, 9))
        make_face()
        with BuildLine():
            Line((-4.25, 9), (-4.25, 9.75))
            ThreePointArc((-4.25, 9.75), (-5, 9), (-4.25, 8.25))
            Line((-4.25, 8.25), (-4.25, 9))
        make_face()
    extrude(amount=-F3_DEPTH, mode=Mode.SUBTRACT)

    # F4 (on face) → F5 (cut)
    with BuildSketch(Plane.XY.offset(3.175)):
        with Locations((8, -3)):
            Circle(F4_R)
        with Locations((8, -12)):
            Circle(F4_R)
    extrude(amount=-F5_DEPTH, mode=Mode.SUBTRACT)


with BuildPart() as f7:
    # F6 (on face) → F7 (new body)
    with BuildSketch(Plane(origin=(0, 0, 0), x_dir=(1, 0, 0), z_dir=(0, 0, -1))):
        Circle(F6_R)
        with Locations((-4.25, -14)):
            Circle(F6_R_2, mode=Mode.SUBTRACT)
        with Locations((-12.9903810568, -7.5)):
            Circle(F6_R_3, mode=Mode.SUBTRACT)
        with Locations((4.25, -14)):
            Circle(F6_R_2, mode=Mode.SUBTRACT)
        with Locations((-14, 0)):
            Circle(F6_R_4, mode=Mode.SUBTRACT)
        Circle(F6_R_5, mode=Mode.SUBTRACT)
        with Locations((14, 0)):
            Circle(F6_R_4, mode=Mode.SUBTRACT)
        with Locations((12.9903810568, 7.5)):
            Circle(F6_R_3, mode=Mode.SUBTRACT)
        with Locations((8, 12)):
            Circle(F6_R_6, mode=Mode.SUBTRACT)
    extrude(amount=F7_DEPTH)


solid = Compound([f1.part, f7.part])
